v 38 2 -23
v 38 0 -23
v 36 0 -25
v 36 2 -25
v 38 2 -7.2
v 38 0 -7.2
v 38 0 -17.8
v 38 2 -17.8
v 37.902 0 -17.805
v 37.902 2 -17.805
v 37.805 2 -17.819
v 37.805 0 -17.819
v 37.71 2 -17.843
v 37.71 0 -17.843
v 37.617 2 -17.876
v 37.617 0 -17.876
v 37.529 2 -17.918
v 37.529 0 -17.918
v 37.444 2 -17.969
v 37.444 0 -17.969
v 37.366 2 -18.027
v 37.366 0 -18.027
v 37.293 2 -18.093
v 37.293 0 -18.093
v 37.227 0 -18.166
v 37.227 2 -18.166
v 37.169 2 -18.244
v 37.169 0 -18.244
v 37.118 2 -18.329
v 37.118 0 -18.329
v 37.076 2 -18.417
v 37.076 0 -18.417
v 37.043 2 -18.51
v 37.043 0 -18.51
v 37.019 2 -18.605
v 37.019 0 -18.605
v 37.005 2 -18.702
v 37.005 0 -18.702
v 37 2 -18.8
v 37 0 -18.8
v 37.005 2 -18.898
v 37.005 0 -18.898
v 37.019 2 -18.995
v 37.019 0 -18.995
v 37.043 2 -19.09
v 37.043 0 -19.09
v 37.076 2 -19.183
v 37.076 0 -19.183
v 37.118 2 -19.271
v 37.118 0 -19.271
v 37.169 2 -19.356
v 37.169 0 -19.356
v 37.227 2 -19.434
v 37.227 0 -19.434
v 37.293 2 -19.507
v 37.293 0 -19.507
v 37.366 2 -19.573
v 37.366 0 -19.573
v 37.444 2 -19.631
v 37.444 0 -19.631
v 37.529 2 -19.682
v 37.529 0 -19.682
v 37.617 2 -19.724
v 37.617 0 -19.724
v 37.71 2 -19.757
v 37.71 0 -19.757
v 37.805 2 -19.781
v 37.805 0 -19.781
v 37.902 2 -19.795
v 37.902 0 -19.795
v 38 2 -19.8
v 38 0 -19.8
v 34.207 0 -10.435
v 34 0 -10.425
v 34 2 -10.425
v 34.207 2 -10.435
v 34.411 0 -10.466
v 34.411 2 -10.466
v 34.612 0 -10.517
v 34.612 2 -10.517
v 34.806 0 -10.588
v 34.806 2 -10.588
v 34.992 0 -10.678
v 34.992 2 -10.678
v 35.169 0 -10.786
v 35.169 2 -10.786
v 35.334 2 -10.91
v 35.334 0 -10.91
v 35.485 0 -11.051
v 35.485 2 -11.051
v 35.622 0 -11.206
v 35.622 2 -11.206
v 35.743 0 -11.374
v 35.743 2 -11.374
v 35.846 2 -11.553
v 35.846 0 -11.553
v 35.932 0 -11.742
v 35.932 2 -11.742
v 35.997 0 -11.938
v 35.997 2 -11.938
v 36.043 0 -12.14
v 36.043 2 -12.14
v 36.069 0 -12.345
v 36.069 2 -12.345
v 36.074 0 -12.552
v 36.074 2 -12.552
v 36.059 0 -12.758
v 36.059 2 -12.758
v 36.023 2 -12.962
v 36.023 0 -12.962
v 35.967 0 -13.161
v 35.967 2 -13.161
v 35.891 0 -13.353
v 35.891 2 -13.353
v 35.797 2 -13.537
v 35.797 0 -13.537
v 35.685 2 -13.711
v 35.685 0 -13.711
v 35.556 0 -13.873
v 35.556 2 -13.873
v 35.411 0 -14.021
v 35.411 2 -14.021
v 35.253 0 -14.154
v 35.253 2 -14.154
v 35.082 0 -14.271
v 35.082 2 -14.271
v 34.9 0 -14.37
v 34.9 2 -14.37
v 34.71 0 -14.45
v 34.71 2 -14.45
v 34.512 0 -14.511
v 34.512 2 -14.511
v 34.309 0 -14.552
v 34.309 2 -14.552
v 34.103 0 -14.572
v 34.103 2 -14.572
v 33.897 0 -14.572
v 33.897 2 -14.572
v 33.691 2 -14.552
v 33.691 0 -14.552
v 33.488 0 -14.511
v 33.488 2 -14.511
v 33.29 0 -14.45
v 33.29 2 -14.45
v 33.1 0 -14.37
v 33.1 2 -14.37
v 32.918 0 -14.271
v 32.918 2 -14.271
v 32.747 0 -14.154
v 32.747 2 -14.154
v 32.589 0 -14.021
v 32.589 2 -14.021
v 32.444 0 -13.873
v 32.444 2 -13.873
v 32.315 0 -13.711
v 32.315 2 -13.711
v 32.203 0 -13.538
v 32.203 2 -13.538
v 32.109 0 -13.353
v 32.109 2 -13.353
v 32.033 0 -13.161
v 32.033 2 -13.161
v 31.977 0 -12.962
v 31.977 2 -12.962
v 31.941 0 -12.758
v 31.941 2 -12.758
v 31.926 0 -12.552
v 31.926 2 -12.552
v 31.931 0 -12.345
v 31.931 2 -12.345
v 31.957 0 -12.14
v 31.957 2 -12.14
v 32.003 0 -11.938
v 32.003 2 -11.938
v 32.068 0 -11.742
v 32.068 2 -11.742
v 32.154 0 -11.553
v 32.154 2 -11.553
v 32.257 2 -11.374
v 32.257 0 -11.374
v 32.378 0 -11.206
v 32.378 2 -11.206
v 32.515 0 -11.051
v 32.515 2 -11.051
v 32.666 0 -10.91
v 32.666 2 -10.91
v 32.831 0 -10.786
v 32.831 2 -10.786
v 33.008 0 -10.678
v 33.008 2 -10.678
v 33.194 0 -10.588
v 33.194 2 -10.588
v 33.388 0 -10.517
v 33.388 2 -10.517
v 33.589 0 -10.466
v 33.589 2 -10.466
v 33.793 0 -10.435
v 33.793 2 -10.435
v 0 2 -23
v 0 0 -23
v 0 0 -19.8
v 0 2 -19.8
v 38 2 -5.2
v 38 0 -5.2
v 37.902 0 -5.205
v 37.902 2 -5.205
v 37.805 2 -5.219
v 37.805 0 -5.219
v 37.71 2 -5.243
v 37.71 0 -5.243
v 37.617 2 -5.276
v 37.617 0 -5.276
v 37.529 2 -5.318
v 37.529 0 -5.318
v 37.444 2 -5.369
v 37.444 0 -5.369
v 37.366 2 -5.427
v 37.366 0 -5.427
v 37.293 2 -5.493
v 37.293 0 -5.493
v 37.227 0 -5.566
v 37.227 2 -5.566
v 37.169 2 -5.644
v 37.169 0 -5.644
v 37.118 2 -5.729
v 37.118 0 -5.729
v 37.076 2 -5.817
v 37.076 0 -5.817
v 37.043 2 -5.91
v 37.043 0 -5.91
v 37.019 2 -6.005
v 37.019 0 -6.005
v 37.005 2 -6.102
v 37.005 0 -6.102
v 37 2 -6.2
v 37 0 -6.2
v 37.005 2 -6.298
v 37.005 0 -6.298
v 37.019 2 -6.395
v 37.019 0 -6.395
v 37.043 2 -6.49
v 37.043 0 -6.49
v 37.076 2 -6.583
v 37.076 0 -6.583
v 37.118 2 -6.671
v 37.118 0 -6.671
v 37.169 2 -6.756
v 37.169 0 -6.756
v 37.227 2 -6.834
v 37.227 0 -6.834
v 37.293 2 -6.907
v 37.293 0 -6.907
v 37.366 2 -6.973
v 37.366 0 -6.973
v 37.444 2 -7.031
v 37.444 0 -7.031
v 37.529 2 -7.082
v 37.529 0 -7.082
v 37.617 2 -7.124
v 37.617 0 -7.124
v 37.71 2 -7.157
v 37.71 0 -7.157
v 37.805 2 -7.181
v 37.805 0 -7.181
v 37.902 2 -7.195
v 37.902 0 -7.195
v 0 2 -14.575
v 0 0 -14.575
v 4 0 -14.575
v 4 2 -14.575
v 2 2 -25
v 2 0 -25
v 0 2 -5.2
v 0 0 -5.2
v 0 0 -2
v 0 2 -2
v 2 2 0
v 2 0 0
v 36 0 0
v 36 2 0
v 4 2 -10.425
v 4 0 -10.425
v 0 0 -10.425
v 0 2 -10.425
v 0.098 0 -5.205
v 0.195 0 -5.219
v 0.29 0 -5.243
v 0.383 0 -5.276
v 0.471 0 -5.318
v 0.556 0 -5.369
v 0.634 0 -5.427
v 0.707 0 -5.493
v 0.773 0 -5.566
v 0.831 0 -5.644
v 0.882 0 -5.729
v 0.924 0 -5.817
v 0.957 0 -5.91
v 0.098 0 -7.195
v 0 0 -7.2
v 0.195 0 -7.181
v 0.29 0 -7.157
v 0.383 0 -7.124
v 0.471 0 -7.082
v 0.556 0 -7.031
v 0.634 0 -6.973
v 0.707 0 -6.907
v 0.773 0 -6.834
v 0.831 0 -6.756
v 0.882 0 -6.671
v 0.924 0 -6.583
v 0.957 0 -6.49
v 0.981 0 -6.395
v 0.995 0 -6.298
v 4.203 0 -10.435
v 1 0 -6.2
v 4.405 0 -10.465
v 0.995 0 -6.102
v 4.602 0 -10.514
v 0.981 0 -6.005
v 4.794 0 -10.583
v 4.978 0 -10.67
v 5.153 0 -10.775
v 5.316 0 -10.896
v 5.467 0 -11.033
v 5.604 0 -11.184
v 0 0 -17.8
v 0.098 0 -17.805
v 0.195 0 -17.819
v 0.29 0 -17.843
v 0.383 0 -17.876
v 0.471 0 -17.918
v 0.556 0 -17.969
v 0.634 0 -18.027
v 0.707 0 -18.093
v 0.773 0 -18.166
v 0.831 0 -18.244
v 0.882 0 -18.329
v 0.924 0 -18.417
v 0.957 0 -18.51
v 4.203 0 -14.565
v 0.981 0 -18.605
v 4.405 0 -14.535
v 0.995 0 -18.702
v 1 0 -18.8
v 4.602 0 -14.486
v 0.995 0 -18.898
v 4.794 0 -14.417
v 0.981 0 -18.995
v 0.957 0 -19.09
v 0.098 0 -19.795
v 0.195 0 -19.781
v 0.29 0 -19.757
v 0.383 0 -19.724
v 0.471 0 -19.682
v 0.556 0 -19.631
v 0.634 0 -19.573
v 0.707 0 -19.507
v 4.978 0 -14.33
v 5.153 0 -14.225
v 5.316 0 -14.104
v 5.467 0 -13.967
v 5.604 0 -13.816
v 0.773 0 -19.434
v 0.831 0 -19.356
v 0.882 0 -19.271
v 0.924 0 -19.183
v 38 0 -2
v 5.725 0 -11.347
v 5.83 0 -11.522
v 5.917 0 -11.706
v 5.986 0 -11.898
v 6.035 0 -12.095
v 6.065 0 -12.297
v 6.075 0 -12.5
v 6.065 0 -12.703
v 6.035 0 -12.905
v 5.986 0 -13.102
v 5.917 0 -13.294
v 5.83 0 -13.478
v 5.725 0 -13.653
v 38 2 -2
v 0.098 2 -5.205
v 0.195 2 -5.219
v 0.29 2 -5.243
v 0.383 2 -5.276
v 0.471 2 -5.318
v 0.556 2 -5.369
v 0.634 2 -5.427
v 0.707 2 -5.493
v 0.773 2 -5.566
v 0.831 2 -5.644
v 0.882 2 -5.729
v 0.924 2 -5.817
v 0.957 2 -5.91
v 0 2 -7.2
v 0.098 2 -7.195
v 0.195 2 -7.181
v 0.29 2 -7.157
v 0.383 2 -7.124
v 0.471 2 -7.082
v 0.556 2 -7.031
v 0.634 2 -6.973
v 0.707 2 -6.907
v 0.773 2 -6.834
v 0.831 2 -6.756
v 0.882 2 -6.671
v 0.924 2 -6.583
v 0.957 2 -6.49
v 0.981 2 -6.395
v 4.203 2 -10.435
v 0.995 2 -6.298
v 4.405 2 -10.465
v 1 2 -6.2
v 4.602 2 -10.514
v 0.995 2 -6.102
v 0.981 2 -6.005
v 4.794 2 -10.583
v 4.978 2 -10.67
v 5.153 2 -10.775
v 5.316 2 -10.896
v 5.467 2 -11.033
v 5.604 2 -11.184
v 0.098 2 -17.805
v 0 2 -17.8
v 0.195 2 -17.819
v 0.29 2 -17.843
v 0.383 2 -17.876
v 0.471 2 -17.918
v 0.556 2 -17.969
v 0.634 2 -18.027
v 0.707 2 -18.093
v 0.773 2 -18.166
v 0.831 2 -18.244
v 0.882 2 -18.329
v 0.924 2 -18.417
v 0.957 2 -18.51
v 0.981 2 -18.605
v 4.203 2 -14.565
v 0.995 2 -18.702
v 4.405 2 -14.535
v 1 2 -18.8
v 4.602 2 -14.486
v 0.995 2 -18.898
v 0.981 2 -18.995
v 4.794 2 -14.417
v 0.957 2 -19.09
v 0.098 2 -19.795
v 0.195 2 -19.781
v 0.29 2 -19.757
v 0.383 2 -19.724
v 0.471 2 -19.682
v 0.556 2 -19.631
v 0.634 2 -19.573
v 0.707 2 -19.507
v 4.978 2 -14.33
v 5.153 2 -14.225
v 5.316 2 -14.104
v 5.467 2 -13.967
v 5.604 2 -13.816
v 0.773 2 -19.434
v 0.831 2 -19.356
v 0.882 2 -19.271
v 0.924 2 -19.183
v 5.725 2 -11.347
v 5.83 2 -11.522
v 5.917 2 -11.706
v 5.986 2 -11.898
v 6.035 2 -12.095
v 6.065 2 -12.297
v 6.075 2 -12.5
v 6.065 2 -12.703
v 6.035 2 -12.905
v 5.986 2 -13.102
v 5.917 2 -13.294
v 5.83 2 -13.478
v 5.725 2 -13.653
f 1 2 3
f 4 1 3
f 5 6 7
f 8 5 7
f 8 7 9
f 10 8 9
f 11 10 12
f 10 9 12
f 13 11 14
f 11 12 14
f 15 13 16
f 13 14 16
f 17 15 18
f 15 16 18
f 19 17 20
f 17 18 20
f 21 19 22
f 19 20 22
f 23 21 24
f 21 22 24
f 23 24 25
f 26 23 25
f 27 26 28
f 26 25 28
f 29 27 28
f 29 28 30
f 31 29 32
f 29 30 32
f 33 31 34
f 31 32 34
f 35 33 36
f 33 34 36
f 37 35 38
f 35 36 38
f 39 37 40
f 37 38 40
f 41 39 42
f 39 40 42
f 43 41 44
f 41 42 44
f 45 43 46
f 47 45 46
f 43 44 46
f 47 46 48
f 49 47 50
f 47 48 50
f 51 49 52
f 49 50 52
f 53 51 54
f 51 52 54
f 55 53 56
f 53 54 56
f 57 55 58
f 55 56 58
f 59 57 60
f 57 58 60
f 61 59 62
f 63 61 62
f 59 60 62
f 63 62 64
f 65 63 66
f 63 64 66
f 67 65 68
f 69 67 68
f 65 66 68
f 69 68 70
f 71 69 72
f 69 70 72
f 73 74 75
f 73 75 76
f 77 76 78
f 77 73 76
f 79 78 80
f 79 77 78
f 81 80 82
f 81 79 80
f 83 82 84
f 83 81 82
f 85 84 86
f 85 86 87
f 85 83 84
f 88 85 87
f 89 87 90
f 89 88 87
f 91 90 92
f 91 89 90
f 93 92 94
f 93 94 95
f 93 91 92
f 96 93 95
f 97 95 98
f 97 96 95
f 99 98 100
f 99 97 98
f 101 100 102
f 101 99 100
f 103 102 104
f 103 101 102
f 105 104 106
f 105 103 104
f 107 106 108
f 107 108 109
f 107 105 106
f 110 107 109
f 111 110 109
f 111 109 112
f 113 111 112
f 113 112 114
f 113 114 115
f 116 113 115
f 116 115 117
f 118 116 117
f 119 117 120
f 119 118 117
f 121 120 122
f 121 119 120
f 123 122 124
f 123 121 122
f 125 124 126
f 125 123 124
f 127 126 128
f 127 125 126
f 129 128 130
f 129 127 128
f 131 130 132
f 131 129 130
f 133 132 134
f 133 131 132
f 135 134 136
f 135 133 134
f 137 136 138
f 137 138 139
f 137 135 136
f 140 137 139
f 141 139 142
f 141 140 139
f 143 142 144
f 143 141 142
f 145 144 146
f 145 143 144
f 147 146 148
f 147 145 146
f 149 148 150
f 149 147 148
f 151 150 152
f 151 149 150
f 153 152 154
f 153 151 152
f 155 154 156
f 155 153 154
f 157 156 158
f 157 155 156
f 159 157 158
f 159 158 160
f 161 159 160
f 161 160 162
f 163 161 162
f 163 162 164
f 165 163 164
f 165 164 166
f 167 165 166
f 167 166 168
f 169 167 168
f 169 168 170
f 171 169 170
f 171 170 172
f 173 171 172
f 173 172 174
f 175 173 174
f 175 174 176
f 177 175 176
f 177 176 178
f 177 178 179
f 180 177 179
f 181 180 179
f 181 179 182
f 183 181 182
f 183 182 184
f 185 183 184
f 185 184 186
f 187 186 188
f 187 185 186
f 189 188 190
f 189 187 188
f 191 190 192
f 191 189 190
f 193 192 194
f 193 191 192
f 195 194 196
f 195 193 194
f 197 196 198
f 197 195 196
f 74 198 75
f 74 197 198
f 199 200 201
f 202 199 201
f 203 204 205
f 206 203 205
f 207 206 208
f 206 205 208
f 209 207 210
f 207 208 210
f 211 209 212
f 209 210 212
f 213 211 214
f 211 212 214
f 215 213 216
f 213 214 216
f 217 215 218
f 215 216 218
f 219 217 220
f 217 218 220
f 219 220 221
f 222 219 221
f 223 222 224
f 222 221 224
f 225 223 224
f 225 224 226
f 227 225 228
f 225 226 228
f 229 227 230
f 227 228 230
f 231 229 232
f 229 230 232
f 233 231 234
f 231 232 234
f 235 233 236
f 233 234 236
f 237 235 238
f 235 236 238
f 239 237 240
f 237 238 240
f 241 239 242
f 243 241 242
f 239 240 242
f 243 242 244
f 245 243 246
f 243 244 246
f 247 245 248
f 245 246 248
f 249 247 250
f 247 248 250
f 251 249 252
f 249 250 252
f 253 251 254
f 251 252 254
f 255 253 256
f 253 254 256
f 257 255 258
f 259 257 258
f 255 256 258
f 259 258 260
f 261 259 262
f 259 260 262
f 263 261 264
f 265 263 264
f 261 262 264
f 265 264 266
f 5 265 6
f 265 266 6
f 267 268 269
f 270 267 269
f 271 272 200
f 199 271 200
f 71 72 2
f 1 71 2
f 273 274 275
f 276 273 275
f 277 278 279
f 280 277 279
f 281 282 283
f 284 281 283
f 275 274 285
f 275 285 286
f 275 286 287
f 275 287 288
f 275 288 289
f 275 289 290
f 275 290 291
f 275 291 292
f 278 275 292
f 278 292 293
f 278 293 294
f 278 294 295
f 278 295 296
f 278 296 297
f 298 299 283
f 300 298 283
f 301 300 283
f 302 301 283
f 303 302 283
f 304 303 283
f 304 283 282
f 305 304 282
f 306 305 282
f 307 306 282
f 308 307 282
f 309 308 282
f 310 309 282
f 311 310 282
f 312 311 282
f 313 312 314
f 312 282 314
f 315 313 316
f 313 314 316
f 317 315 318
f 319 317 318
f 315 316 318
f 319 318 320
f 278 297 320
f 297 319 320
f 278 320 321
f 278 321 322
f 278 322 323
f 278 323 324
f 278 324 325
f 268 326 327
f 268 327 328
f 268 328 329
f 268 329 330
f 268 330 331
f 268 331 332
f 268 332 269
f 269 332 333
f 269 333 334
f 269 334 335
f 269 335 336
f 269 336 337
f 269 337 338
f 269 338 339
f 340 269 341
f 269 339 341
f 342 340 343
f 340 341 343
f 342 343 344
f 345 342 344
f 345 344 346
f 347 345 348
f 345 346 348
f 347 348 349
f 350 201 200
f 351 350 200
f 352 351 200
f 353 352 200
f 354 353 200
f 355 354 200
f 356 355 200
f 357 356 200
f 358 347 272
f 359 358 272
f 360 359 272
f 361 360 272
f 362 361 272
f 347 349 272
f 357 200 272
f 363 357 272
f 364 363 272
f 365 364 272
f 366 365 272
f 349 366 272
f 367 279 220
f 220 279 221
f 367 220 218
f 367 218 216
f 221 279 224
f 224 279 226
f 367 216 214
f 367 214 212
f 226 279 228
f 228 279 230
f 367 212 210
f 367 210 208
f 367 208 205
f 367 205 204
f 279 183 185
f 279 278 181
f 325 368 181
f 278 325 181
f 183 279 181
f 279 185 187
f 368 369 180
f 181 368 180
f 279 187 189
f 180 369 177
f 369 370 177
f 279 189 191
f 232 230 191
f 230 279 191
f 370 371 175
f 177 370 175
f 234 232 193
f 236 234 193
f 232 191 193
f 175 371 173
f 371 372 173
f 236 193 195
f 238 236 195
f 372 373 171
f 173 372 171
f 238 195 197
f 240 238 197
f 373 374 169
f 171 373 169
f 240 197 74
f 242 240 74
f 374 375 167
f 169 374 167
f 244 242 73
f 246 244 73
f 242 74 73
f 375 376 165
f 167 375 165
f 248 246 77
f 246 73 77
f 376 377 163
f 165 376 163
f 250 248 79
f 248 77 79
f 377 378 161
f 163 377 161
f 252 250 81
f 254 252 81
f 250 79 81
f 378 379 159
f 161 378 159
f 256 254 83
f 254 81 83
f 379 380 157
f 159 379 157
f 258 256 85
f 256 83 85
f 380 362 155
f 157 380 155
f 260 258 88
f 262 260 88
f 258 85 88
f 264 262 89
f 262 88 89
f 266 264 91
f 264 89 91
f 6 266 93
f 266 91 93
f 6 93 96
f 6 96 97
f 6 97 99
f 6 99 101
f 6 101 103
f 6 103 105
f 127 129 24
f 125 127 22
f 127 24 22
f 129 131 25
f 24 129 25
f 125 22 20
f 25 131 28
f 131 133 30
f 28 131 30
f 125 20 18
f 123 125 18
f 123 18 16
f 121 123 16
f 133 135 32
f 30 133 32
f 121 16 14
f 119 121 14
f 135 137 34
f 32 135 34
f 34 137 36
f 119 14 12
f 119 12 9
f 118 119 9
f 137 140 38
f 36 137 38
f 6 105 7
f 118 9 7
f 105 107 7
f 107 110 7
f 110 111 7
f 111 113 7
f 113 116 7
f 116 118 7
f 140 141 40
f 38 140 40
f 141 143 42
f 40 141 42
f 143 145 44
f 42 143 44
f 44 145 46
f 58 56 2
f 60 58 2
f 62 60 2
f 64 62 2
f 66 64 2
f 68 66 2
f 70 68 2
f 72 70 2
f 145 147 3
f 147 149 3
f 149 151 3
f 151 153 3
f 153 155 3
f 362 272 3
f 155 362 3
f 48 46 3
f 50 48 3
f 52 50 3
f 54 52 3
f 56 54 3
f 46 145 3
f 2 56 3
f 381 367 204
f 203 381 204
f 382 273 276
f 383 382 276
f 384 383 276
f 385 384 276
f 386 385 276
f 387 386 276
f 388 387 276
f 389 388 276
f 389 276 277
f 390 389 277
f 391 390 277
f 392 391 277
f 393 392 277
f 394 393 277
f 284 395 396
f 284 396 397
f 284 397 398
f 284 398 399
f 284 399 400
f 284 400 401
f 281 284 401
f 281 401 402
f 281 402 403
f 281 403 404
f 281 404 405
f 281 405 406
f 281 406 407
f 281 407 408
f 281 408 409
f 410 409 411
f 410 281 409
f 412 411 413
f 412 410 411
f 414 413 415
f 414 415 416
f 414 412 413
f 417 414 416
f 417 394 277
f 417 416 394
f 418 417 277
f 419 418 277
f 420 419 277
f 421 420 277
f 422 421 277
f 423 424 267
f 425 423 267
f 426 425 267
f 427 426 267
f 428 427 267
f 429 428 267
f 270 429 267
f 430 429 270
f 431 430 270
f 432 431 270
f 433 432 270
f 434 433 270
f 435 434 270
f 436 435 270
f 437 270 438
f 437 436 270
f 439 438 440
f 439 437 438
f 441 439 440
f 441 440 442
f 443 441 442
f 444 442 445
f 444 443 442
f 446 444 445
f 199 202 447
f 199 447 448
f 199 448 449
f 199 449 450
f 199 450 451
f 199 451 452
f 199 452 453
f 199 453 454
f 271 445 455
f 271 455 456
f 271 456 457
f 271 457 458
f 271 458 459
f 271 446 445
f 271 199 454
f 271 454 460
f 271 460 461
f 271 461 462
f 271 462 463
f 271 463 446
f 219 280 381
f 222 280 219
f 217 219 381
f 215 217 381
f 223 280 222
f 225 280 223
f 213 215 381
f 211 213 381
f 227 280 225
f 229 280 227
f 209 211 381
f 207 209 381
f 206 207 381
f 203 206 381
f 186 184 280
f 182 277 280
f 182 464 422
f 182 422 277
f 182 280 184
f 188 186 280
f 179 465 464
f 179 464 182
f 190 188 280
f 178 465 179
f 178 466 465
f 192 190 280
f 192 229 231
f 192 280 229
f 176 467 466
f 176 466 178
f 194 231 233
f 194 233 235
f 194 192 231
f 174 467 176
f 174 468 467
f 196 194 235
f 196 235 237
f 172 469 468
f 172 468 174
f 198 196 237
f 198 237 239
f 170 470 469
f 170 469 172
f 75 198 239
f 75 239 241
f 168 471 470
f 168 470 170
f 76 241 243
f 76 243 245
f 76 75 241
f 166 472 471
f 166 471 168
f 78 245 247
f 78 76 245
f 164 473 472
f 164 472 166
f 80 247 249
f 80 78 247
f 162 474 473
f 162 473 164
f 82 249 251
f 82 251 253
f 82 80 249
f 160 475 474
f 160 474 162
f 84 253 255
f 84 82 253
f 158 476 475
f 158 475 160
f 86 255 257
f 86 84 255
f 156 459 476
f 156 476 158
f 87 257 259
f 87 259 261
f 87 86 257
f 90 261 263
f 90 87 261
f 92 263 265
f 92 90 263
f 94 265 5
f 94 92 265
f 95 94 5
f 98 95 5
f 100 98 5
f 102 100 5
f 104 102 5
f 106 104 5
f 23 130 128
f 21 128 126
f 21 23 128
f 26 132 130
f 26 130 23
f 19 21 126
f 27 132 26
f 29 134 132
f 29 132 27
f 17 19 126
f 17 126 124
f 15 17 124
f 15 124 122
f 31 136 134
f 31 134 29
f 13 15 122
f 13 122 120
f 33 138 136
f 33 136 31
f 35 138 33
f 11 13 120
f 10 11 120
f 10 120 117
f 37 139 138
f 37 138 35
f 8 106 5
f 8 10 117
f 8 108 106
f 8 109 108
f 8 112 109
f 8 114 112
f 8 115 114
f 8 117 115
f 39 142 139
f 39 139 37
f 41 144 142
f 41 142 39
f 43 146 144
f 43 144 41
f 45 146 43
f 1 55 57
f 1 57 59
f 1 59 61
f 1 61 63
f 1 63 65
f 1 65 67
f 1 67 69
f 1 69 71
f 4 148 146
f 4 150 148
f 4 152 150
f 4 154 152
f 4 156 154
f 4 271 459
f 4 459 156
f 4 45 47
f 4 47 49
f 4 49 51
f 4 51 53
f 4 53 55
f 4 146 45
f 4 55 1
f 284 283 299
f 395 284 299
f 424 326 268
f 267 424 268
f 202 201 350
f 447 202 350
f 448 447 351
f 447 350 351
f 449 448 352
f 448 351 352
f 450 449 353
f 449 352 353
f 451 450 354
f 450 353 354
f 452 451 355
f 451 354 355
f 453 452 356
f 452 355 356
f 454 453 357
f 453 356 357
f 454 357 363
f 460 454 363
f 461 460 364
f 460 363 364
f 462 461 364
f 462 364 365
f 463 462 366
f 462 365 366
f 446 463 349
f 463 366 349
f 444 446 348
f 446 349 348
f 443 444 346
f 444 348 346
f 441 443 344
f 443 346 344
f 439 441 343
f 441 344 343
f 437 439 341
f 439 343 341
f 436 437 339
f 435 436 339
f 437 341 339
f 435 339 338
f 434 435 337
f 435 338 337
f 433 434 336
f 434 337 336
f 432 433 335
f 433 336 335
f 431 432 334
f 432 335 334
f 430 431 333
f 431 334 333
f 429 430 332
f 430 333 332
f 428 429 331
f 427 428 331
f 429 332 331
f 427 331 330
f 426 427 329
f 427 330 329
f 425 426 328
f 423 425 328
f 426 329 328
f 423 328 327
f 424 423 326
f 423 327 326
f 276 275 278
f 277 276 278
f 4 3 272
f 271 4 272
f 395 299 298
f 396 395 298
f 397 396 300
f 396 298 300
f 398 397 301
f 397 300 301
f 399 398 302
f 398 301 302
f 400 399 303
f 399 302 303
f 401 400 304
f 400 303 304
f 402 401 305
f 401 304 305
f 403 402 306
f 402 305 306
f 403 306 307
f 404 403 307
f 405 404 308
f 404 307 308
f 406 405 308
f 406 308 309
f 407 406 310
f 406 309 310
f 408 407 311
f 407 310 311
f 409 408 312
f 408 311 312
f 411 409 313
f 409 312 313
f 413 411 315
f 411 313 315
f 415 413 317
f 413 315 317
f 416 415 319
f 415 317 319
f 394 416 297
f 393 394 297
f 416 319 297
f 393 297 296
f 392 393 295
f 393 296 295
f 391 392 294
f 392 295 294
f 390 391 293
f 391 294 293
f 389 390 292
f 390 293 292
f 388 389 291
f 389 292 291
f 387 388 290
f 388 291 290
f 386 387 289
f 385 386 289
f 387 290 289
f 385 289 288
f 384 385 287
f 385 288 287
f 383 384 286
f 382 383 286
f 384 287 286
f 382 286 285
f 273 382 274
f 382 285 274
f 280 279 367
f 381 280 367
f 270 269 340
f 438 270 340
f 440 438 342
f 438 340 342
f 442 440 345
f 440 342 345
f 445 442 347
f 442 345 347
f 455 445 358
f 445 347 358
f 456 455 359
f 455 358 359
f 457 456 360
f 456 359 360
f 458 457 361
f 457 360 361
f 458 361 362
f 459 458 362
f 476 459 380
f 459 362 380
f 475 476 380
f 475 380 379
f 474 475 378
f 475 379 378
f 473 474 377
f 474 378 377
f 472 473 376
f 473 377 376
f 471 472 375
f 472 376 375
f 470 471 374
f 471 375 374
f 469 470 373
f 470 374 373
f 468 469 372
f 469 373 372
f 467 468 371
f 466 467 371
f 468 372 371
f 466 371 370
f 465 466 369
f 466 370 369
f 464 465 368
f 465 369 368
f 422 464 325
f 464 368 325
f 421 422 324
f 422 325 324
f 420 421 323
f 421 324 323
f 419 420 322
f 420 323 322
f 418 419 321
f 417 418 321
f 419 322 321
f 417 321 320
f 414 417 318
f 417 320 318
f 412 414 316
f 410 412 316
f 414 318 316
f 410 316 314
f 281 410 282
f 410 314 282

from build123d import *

# Parameters (mm, degrees)
SKETCH1_R      = 2.075
EXTRUDE1_DEPTH = 2


with BuildPart() as part:
    # Sketch1 → Extrude1 (new body)
    with BuildSketch(Plane(origin=(0, 0, 0), x_dir=(1, 0, 0), z_dir=(0, 1, 0))):
        with BuildLine():
            Line((2, 0), (36, 0))
            Line((36, 0), (38, 2))
            Line((38, 2), (38, 5.2))
            ThreePointArc((38, 5.2), (37, 6.2), (38, 7.2))
            Line((38, 7.2), (38, 17.8))
            ThreePointArc((38, 17.8), (37, 18.8), (38, 19.8))
            Line((38, 19.8), (38, 23))
            Line((38, 23), (36, 25))
            Line((36, 25), (2, 25))
            Line((2, 25), (0, 23))
            Line((0, 23), (0, 19.8))
            ThreePointArc((0, 19.8), (1, 18.8), (0, 17.8))
            Line((0, 17.8), (0, 14.575))
            Line((0, 14.575), (4, 14.575))
            ThreePointArc((4, 14.575), (6.075, 12.5), (4, 10.425))
            Line((4, 10.425), (0, 10.425))
            Line((0, 10.425), (0, 7.2))
            ThreePointArc((0, 7.2), (1, 6.2), (0, 5.2))
            Line((0, 5.2), (0, 2))
            Line((0, 2), (2, 0))
        make_face()
        with Locations(Location((34, 12.5, 0), (0, 0, 270))):  # turned: the seam where the file's is
            Circle(SKETCH1_R, mode=Mode.SUBTRACT)
    extrude(amount=EXTRUDE1_DEPTH)


solid = part.part
